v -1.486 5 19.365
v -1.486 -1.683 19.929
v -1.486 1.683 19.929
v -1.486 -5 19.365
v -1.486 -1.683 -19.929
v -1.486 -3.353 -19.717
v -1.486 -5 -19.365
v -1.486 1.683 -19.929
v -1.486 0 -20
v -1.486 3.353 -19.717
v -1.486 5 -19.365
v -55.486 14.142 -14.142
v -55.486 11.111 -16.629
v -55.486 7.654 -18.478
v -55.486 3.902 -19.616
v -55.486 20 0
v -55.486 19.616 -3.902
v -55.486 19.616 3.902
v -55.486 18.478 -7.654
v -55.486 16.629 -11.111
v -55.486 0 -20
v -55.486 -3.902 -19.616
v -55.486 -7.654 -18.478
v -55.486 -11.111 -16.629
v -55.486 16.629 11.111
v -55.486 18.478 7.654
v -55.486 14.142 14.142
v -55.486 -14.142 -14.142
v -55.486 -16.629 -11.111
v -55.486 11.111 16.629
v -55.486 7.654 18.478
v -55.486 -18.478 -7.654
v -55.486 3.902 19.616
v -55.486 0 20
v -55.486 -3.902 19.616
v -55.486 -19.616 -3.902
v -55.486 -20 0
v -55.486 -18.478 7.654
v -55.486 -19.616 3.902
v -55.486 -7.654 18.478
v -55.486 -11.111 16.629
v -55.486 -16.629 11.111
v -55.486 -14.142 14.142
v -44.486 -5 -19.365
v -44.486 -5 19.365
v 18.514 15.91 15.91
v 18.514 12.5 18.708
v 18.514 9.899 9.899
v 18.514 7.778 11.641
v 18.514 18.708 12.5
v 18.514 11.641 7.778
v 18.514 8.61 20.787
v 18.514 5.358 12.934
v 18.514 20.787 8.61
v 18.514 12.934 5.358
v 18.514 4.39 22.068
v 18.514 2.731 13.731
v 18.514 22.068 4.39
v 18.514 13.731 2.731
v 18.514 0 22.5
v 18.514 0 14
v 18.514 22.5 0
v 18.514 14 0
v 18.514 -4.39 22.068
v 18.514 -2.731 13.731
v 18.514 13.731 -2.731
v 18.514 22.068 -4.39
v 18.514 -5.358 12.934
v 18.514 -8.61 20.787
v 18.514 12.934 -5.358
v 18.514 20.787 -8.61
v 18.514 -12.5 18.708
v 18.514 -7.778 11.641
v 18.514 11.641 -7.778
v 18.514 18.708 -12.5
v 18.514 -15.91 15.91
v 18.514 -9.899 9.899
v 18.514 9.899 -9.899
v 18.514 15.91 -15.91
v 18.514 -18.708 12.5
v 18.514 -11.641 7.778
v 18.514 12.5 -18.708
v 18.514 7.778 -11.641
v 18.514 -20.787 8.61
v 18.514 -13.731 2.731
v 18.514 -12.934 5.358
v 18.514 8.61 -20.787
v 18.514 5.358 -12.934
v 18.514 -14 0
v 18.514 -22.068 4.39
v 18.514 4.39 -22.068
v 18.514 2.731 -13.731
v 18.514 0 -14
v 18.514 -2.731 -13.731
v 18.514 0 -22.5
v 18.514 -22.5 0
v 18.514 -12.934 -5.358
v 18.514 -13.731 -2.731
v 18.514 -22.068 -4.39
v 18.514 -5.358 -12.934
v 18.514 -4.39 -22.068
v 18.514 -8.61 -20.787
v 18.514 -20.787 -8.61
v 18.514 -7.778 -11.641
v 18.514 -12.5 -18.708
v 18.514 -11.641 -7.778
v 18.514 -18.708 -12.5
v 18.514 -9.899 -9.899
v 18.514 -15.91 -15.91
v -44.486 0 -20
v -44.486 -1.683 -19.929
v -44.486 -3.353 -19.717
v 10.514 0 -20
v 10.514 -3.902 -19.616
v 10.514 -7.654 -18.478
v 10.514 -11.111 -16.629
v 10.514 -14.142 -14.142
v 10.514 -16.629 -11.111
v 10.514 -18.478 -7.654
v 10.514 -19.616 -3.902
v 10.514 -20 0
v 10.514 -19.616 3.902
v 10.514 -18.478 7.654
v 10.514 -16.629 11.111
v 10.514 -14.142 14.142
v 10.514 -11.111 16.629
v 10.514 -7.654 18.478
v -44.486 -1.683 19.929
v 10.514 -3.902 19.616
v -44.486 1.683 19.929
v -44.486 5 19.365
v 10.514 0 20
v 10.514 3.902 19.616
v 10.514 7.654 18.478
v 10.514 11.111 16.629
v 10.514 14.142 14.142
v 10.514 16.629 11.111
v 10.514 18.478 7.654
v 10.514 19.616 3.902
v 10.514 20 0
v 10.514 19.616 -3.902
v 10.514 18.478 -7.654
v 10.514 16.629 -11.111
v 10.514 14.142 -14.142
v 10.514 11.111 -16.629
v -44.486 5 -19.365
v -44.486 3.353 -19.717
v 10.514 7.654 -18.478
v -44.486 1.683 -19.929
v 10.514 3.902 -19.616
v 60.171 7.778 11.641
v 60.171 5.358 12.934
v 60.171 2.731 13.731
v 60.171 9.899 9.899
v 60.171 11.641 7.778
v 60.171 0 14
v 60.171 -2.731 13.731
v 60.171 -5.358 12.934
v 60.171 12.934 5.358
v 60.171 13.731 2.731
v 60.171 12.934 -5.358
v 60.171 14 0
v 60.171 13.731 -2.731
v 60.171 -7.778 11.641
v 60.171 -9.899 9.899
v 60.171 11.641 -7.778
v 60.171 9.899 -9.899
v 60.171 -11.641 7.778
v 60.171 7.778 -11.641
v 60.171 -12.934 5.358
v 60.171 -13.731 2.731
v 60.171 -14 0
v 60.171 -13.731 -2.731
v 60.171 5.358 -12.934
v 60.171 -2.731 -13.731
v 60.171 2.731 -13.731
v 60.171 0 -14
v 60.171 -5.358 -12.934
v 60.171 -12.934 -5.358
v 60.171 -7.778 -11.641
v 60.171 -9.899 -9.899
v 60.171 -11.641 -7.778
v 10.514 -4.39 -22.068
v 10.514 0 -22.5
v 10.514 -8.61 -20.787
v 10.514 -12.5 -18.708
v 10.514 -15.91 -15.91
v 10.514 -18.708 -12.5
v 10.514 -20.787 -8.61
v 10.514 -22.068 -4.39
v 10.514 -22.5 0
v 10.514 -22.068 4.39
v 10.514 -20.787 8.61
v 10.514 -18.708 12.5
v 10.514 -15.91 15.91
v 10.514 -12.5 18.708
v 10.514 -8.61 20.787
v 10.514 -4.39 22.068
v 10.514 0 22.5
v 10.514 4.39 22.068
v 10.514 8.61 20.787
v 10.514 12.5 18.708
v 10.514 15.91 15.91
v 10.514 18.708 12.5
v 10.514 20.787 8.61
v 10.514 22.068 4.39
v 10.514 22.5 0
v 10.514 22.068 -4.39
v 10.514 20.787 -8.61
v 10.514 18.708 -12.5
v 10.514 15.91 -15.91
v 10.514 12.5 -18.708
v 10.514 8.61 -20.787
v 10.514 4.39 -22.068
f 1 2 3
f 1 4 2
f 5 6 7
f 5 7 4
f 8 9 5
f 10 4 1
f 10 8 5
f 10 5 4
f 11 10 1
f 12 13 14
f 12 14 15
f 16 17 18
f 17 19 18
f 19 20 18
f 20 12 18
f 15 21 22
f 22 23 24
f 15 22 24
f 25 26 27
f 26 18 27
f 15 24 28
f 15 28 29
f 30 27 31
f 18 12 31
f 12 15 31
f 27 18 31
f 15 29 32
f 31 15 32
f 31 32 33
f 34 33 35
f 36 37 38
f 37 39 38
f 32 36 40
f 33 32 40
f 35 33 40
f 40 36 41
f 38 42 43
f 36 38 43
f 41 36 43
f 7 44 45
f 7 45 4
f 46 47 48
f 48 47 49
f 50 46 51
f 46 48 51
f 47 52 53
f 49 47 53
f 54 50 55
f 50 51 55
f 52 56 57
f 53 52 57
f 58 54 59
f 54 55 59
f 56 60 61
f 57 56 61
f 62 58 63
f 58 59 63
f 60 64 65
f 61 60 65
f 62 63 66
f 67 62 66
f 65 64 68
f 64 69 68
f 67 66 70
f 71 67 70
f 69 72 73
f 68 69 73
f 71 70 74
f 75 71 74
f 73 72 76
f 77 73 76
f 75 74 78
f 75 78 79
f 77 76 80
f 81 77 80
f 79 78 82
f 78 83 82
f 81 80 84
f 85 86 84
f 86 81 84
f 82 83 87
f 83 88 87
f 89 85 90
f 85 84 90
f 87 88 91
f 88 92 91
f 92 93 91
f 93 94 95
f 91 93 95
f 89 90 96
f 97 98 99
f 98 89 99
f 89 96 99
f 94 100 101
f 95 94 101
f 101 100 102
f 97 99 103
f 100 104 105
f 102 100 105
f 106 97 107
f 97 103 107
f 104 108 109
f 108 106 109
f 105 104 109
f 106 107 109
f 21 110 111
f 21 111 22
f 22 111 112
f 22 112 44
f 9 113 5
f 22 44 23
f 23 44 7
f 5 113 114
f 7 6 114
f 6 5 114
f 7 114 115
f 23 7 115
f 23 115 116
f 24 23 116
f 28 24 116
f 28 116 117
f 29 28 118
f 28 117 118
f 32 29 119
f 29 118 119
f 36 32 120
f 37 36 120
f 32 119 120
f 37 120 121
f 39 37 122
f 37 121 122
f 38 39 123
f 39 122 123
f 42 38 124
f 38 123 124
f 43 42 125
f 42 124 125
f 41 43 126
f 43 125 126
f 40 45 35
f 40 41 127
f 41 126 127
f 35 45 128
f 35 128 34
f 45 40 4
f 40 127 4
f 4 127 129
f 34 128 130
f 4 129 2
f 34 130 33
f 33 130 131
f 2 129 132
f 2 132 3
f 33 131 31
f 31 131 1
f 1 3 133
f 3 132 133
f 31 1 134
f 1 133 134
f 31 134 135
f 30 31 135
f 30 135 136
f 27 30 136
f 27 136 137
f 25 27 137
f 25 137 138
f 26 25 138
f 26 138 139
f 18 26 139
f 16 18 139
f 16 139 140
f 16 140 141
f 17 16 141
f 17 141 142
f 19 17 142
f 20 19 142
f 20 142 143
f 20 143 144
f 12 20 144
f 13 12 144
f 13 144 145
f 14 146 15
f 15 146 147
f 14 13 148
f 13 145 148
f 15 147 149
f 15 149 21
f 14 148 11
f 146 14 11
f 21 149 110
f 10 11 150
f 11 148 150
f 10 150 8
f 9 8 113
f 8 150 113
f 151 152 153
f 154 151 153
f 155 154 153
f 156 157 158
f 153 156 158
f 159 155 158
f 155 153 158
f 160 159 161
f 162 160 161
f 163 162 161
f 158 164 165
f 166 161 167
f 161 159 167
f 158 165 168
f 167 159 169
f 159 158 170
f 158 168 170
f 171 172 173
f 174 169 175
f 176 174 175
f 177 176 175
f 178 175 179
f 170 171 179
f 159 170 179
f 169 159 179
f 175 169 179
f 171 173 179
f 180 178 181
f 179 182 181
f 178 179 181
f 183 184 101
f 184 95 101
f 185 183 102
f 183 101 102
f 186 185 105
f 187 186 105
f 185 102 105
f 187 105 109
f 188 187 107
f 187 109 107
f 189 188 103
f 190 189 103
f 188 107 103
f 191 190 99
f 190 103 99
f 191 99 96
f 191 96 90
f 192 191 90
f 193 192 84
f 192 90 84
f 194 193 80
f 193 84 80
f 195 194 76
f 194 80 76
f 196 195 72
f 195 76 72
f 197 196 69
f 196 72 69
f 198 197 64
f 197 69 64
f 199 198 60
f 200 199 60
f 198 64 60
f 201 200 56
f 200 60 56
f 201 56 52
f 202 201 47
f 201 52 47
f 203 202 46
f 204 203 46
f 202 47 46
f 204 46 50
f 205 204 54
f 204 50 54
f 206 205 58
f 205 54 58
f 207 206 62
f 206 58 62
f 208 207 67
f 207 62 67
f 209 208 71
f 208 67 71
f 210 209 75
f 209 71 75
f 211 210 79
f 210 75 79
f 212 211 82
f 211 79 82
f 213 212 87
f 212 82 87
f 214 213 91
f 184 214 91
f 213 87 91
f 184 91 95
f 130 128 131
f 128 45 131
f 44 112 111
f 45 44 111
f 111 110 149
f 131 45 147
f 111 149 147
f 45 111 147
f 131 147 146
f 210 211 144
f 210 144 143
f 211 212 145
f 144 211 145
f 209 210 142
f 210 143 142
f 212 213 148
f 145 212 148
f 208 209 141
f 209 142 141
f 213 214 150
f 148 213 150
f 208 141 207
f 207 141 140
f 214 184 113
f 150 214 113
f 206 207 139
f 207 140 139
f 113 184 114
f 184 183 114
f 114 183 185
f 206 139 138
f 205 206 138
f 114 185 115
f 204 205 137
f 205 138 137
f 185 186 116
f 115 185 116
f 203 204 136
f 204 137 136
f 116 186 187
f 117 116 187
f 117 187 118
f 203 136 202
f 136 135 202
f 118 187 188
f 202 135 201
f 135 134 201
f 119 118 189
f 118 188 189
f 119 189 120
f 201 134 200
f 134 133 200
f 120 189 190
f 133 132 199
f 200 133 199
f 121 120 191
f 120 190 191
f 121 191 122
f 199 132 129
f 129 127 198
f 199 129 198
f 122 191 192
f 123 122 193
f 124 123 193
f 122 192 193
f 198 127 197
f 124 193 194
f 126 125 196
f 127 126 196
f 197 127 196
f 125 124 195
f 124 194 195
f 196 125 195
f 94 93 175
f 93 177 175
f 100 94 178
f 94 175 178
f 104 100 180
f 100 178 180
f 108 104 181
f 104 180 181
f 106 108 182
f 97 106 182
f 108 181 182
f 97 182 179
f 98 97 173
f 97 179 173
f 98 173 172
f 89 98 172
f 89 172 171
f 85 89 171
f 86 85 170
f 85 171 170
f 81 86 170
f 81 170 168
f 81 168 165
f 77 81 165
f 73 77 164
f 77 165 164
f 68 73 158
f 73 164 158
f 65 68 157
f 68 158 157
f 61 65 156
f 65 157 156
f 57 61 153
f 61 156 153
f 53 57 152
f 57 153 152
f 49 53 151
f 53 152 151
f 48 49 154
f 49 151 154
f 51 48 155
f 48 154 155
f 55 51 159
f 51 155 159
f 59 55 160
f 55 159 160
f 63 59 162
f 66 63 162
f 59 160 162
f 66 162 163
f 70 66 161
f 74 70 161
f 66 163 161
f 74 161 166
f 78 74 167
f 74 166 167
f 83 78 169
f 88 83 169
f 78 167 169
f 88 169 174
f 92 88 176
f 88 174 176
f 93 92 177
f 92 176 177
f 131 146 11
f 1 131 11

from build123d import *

# Parameters (mm, degrees)
CUT_EXTRUDE1_DEPTH      = 69.066884873
CUT_EXTRUDE1_DEPTH_BACK = 69.066884873
SKETCH2_W               = 43
SKETCH2_H               = 10


with BuildPart() as part:
    # Sketch1 → Revolve1 (revolve)
    with BuildSketch(Plane(origin=(0, 0, 0), x_dir=(1, 0, 0), z_dir=(0, 1, 0))):
        Polygon((-55.485714286, 0), (-55.485714286, 20), (10.514285714, 20), (10.514285714, 22.5), (18.514285714, 22.5), (18.514285714, 14), (60.171428571, 14), (60.171428571, 0), align=None)
    revolve(axis=Axis((60.171428571, 0, 0), (-1, 0, 0)))

    # Sketch2 → Cut-Extrude1 (cut, two sides: drawn at the far end of the back side and taken through both)
    with BuildSketch(Plane.XY.offset(-CUT_EXTRUDE1_DEPTH_BACK)):
        with Locations((-22.985714286, 0)):
            Rectangle(SKETCH2_W, SKETCH2_H)
    extrude(amount=CUT_EXTRUDE1_DEPTH + CUT_EXTRUDE1_DEPTH_BACK, mode=Mode.SUBTRACT)


solid = part.part
